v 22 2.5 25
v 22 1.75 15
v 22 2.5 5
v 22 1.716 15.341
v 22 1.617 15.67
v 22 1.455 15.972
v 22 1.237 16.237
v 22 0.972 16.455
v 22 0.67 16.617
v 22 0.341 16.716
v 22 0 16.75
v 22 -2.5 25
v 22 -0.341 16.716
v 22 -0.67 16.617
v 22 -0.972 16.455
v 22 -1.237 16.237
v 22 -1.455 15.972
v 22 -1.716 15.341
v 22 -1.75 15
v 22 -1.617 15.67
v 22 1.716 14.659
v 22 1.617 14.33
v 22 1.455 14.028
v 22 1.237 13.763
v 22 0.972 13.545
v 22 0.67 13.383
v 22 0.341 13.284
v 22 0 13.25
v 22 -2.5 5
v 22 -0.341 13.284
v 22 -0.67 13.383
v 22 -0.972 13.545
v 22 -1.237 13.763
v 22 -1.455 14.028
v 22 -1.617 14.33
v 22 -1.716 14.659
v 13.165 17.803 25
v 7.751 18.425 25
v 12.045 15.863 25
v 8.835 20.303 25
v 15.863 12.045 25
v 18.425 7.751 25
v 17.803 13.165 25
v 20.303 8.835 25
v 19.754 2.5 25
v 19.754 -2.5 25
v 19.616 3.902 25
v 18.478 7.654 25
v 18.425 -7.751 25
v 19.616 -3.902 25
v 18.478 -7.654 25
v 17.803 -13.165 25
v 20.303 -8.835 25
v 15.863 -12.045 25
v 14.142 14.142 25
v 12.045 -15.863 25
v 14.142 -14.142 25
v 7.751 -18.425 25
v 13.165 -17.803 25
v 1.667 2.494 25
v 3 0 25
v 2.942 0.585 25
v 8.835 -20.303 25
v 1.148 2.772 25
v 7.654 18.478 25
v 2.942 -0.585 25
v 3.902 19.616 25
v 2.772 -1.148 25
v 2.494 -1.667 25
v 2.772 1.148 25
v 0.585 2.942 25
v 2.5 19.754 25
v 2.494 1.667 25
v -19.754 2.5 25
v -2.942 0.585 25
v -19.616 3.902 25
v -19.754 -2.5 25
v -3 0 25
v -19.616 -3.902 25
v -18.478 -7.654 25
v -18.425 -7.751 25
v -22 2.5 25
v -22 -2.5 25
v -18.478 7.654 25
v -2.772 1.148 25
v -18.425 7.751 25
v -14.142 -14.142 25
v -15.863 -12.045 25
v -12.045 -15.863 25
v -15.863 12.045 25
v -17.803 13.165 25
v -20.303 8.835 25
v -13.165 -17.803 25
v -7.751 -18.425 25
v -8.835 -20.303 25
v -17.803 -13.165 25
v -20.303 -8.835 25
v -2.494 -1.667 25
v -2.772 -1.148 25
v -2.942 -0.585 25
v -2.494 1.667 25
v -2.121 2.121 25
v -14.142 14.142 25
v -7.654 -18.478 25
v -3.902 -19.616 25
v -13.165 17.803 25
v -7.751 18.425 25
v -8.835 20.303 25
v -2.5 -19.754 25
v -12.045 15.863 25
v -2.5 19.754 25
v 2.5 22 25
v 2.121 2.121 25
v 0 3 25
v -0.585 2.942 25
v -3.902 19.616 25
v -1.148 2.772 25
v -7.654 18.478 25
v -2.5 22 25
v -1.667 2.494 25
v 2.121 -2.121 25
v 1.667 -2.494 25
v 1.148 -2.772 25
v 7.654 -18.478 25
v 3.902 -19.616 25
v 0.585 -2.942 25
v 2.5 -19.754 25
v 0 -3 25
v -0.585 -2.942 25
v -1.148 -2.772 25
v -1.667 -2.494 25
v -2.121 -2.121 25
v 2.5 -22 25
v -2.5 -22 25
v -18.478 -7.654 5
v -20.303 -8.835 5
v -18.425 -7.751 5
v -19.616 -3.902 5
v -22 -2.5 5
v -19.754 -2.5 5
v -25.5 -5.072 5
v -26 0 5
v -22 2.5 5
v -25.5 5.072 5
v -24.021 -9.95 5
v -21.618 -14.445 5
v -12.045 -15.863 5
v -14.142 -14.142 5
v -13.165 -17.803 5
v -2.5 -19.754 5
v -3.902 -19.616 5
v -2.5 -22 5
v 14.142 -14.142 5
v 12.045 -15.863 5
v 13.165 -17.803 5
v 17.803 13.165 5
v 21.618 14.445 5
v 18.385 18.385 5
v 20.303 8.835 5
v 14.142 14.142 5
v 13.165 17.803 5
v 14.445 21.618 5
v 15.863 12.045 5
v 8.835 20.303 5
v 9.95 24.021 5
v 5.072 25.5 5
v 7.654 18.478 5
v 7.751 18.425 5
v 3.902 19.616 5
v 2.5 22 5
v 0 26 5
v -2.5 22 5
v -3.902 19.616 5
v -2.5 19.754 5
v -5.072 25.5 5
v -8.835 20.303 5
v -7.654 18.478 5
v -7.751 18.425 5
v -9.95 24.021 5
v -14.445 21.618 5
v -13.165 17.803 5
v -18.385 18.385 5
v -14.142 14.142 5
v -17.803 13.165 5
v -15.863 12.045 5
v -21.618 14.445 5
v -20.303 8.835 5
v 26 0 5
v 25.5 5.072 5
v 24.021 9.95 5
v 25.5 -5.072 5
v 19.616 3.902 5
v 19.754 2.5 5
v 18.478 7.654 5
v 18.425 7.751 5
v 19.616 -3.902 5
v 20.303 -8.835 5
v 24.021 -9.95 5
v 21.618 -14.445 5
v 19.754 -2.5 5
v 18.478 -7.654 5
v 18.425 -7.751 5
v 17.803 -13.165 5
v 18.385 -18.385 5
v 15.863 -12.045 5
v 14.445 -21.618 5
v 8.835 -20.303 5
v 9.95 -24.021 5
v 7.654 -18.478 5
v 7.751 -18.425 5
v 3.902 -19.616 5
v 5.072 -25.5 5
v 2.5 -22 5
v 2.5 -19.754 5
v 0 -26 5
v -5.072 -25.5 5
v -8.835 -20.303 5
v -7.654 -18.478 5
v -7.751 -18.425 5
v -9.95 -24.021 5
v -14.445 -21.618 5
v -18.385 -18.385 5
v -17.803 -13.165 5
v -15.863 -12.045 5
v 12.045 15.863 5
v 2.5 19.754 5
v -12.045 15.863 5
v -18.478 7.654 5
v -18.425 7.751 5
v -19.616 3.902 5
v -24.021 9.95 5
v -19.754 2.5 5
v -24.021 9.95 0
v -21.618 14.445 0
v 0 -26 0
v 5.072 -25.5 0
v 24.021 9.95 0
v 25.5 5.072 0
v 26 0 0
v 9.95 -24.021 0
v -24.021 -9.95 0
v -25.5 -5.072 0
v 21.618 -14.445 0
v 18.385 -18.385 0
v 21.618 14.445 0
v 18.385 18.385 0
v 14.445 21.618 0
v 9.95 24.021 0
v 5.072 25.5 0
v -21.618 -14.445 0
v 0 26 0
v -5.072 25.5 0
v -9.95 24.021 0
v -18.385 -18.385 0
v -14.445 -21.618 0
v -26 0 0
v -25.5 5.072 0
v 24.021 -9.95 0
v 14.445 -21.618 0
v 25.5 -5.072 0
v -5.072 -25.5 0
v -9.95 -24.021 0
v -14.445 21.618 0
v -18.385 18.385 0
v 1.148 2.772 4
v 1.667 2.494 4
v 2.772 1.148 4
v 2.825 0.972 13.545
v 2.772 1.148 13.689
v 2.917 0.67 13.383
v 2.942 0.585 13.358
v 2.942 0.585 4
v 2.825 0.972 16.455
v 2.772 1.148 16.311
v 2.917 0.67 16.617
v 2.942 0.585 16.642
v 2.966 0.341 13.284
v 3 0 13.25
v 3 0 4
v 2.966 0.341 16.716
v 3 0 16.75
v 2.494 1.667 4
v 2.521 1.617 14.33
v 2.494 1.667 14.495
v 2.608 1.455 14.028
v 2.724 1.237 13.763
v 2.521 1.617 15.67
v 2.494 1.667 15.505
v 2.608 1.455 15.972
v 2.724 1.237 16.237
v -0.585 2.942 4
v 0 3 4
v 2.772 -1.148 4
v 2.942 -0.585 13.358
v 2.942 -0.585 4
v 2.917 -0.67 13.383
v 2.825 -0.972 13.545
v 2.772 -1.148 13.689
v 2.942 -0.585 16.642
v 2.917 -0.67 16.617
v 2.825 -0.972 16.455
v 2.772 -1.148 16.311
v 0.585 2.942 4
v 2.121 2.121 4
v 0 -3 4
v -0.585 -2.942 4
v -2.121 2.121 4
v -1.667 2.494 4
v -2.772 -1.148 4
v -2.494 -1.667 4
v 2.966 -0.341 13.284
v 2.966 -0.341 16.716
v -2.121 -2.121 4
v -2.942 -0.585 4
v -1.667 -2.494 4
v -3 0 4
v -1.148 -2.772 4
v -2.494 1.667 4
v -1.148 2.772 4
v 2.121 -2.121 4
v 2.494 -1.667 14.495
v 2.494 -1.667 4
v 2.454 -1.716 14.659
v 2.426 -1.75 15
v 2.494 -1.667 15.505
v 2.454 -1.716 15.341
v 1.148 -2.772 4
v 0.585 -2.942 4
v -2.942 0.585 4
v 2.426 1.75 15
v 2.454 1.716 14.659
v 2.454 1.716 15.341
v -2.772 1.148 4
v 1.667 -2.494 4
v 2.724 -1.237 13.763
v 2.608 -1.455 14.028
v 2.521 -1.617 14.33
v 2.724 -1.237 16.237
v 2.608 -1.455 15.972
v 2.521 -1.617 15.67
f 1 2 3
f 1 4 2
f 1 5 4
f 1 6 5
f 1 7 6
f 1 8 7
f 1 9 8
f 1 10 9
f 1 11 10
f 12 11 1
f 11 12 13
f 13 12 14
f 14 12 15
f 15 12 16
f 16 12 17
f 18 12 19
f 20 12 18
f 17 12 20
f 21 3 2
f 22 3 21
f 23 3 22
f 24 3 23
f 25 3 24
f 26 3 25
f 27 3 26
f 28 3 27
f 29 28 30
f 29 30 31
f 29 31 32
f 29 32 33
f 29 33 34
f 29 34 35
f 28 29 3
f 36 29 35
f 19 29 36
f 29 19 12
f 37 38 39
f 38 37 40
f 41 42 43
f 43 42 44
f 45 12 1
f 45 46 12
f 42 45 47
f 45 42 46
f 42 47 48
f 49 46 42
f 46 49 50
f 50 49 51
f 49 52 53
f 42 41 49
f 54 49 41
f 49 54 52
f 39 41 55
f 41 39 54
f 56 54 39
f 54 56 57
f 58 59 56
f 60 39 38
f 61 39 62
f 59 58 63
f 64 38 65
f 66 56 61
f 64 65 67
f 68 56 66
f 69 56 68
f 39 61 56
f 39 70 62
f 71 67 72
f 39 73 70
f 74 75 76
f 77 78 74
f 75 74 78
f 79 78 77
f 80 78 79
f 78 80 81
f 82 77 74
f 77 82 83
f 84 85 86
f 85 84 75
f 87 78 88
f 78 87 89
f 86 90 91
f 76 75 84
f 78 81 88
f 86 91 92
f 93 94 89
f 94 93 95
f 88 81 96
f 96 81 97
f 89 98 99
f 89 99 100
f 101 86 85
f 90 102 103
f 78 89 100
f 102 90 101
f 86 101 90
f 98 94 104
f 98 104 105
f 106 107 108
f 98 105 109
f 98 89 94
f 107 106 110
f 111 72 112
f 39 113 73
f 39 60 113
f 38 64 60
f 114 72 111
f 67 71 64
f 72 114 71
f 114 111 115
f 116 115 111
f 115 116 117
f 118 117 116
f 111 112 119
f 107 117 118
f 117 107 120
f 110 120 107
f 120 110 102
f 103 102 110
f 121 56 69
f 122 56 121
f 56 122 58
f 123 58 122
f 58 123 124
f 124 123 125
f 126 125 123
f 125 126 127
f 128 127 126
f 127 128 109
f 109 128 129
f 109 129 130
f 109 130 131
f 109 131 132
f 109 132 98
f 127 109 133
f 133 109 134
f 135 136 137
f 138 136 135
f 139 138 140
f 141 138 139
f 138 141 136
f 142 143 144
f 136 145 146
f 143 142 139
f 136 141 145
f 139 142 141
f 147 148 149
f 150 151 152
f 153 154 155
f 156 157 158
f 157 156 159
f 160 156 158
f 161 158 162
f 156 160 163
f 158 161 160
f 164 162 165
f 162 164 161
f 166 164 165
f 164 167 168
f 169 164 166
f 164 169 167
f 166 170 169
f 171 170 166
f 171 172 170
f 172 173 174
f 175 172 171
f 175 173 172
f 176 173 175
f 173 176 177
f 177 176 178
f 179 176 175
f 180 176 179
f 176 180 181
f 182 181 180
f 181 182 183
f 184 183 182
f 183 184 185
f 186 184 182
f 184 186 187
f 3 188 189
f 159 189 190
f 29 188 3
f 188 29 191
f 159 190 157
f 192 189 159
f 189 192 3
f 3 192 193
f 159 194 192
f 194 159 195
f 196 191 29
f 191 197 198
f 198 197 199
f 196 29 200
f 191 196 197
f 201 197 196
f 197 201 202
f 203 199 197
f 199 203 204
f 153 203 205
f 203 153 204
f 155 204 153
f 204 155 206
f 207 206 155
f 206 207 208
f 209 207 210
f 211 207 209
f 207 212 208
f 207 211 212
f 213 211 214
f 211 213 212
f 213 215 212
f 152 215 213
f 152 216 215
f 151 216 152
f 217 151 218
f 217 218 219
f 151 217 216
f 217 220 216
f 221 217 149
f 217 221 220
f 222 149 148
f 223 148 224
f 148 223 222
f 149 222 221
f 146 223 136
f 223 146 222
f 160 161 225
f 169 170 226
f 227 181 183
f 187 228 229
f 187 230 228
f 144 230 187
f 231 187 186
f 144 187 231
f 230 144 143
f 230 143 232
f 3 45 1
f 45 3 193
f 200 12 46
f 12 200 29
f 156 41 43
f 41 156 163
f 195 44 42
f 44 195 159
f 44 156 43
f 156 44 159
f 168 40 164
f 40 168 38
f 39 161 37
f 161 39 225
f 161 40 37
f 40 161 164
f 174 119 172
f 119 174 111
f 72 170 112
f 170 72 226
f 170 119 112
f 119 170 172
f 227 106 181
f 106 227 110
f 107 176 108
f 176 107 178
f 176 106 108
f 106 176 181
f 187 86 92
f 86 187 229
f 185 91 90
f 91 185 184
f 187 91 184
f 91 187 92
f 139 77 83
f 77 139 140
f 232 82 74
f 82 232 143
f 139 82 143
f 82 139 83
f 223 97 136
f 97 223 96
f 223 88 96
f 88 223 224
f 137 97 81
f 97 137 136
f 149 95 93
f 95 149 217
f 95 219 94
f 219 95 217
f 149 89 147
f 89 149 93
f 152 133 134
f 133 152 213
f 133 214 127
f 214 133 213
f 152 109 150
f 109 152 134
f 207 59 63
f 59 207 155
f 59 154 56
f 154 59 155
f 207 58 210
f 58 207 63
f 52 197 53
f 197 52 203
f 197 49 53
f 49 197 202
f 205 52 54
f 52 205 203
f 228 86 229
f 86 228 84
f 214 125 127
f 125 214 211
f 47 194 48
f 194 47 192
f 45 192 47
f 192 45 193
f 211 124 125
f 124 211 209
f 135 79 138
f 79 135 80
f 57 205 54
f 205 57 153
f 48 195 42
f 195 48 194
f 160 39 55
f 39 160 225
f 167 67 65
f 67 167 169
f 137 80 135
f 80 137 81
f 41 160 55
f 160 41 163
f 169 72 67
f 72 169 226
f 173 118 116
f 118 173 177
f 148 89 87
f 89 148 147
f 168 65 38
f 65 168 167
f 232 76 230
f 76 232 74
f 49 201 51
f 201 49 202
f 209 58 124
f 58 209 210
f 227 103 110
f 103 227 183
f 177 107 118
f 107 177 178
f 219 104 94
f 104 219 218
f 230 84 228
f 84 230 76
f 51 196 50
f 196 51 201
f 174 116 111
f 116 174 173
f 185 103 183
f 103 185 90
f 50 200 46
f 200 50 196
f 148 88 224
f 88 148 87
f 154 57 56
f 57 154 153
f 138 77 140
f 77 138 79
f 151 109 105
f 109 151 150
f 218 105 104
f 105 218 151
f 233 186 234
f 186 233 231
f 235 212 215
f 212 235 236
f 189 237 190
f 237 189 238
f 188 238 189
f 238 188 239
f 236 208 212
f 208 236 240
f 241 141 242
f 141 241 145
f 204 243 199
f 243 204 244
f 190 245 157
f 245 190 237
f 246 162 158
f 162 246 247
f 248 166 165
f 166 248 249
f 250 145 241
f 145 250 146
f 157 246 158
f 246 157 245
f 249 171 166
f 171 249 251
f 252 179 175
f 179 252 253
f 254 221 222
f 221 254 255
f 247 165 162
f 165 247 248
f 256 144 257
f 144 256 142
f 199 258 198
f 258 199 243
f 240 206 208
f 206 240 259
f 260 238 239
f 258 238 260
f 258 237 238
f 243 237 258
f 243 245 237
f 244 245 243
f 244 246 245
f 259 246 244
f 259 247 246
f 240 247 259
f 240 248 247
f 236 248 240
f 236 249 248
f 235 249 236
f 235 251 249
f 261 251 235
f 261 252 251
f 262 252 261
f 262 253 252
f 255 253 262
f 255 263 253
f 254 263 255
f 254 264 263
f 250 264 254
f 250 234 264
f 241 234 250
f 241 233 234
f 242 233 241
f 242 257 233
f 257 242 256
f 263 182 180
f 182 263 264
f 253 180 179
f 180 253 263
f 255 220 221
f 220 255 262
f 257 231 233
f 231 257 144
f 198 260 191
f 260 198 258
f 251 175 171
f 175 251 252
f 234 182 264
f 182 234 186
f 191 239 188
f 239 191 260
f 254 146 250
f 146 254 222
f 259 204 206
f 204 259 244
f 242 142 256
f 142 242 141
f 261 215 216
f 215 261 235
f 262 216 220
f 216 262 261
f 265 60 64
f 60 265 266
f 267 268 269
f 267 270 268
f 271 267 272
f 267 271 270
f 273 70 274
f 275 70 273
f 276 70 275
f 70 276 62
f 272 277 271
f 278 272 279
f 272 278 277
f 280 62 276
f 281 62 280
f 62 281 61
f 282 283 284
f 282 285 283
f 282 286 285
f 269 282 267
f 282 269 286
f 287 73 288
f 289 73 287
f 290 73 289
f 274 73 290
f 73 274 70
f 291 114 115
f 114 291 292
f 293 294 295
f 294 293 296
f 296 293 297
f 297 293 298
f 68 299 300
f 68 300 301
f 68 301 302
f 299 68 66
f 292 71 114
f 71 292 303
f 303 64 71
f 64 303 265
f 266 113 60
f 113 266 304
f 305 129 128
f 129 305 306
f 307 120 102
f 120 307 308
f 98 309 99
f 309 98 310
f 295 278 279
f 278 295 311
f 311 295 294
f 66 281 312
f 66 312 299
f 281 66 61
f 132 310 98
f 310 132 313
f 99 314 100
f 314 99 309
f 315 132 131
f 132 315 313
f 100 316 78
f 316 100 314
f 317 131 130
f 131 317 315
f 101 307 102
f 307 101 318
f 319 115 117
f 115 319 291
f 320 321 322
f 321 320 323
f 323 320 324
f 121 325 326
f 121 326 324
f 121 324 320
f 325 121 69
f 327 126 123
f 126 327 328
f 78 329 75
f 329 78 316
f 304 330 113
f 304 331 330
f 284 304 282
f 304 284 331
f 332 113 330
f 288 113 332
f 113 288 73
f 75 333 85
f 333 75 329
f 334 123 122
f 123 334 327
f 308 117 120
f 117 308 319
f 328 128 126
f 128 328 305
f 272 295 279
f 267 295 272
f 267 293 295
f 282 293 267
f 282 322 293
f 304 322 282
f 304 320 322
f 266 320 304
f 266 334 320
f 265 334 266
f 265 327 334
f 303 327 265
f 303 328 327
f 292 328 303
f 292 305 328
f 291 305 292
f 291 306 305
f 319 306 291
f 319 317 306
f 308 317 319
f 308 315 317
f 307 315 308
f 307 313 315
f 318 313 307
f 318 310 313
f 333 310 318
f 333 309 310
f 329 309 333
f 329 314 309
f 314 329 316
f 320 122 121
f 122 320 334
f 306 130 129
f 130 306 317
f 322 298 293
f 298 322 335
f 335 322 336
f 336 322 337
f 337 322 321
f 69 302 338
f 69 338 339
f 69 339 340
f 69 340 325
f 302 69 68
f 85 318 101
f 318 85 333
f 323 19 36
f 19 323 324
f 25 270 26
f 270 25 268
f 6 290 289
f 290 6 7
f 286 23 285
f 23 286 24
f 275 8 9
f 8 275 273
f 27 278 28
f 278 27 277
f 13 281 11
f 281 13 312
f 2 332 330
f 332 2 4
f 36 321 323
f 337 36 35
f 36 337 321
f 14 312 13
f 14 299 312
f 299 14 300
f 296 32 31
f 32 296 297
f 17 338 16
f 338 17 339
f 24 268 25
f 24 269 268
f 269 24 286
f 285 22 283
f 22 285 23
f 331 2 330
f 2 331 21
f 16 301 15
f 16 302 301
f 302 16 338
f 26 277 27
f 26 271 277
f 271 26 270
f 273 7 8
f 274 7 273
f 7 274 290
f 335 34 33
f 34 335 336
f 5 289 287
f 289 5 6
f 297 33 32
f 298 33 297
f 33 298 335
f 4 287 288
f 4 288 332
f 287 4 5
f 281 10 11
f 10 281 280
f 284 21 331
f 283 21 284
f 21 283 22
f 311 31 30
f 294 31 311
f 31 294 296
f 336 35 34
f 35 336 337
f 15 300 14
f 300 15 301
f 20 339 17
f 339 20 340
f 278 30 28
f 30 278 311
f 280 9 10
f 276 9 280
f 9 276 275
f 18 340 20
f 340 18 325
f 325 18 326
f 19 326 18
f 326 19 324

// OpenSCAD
$fn = 32;

// ----------------------------------------------------------------------
// Control knob: skirt knob with grip ribs
// ----------------------------------------------------------------------

// --- parameters (mm) ---
skirt_d = 52;             // skirt diameter
skirt_t = 5;              // skirt thickness
rib_w = 5;                // grip rib width
rib_out = 3;              // grip rib radial protrusion
n_ribs = 12;              // number of grip ribs
knob_d = 40;              // knob body diameter
knob_h = 20;              // knob body height
bore_d = 6;               // shaft bore diameter
set_d = 3.5;              // set screw bore diameter

rib_step = 360 / n_ribs;  // rib angular step
total_h = skirt_t + knob_h;  // overall height

difference() {
  union() {
    translate([0, 0, skirt_t]) cylinder(h = knob_h, d = knob_d);
    cylinder(h = skirt_t, d = skirt_d);
    for (i = [0 : n_ribs - 1])
      rotate([0, 0, i * rib_step])
        translate([knob_d / 2 - 1, -rib_w / 2, skirt_t])
          cube([rib_out, rib_w, knob_h]);
  }
  translate([0, 0, skirt_t - 1]) cylinder(h = knob_h + 2, d = bore_d);
  translate([-1, 0, skirt_t + knob_h / 2]) rotate([0, 90, 0])
    cylinder(h = knob_d / 2 + bore_d / 2 + 2, d = set_d);
}
